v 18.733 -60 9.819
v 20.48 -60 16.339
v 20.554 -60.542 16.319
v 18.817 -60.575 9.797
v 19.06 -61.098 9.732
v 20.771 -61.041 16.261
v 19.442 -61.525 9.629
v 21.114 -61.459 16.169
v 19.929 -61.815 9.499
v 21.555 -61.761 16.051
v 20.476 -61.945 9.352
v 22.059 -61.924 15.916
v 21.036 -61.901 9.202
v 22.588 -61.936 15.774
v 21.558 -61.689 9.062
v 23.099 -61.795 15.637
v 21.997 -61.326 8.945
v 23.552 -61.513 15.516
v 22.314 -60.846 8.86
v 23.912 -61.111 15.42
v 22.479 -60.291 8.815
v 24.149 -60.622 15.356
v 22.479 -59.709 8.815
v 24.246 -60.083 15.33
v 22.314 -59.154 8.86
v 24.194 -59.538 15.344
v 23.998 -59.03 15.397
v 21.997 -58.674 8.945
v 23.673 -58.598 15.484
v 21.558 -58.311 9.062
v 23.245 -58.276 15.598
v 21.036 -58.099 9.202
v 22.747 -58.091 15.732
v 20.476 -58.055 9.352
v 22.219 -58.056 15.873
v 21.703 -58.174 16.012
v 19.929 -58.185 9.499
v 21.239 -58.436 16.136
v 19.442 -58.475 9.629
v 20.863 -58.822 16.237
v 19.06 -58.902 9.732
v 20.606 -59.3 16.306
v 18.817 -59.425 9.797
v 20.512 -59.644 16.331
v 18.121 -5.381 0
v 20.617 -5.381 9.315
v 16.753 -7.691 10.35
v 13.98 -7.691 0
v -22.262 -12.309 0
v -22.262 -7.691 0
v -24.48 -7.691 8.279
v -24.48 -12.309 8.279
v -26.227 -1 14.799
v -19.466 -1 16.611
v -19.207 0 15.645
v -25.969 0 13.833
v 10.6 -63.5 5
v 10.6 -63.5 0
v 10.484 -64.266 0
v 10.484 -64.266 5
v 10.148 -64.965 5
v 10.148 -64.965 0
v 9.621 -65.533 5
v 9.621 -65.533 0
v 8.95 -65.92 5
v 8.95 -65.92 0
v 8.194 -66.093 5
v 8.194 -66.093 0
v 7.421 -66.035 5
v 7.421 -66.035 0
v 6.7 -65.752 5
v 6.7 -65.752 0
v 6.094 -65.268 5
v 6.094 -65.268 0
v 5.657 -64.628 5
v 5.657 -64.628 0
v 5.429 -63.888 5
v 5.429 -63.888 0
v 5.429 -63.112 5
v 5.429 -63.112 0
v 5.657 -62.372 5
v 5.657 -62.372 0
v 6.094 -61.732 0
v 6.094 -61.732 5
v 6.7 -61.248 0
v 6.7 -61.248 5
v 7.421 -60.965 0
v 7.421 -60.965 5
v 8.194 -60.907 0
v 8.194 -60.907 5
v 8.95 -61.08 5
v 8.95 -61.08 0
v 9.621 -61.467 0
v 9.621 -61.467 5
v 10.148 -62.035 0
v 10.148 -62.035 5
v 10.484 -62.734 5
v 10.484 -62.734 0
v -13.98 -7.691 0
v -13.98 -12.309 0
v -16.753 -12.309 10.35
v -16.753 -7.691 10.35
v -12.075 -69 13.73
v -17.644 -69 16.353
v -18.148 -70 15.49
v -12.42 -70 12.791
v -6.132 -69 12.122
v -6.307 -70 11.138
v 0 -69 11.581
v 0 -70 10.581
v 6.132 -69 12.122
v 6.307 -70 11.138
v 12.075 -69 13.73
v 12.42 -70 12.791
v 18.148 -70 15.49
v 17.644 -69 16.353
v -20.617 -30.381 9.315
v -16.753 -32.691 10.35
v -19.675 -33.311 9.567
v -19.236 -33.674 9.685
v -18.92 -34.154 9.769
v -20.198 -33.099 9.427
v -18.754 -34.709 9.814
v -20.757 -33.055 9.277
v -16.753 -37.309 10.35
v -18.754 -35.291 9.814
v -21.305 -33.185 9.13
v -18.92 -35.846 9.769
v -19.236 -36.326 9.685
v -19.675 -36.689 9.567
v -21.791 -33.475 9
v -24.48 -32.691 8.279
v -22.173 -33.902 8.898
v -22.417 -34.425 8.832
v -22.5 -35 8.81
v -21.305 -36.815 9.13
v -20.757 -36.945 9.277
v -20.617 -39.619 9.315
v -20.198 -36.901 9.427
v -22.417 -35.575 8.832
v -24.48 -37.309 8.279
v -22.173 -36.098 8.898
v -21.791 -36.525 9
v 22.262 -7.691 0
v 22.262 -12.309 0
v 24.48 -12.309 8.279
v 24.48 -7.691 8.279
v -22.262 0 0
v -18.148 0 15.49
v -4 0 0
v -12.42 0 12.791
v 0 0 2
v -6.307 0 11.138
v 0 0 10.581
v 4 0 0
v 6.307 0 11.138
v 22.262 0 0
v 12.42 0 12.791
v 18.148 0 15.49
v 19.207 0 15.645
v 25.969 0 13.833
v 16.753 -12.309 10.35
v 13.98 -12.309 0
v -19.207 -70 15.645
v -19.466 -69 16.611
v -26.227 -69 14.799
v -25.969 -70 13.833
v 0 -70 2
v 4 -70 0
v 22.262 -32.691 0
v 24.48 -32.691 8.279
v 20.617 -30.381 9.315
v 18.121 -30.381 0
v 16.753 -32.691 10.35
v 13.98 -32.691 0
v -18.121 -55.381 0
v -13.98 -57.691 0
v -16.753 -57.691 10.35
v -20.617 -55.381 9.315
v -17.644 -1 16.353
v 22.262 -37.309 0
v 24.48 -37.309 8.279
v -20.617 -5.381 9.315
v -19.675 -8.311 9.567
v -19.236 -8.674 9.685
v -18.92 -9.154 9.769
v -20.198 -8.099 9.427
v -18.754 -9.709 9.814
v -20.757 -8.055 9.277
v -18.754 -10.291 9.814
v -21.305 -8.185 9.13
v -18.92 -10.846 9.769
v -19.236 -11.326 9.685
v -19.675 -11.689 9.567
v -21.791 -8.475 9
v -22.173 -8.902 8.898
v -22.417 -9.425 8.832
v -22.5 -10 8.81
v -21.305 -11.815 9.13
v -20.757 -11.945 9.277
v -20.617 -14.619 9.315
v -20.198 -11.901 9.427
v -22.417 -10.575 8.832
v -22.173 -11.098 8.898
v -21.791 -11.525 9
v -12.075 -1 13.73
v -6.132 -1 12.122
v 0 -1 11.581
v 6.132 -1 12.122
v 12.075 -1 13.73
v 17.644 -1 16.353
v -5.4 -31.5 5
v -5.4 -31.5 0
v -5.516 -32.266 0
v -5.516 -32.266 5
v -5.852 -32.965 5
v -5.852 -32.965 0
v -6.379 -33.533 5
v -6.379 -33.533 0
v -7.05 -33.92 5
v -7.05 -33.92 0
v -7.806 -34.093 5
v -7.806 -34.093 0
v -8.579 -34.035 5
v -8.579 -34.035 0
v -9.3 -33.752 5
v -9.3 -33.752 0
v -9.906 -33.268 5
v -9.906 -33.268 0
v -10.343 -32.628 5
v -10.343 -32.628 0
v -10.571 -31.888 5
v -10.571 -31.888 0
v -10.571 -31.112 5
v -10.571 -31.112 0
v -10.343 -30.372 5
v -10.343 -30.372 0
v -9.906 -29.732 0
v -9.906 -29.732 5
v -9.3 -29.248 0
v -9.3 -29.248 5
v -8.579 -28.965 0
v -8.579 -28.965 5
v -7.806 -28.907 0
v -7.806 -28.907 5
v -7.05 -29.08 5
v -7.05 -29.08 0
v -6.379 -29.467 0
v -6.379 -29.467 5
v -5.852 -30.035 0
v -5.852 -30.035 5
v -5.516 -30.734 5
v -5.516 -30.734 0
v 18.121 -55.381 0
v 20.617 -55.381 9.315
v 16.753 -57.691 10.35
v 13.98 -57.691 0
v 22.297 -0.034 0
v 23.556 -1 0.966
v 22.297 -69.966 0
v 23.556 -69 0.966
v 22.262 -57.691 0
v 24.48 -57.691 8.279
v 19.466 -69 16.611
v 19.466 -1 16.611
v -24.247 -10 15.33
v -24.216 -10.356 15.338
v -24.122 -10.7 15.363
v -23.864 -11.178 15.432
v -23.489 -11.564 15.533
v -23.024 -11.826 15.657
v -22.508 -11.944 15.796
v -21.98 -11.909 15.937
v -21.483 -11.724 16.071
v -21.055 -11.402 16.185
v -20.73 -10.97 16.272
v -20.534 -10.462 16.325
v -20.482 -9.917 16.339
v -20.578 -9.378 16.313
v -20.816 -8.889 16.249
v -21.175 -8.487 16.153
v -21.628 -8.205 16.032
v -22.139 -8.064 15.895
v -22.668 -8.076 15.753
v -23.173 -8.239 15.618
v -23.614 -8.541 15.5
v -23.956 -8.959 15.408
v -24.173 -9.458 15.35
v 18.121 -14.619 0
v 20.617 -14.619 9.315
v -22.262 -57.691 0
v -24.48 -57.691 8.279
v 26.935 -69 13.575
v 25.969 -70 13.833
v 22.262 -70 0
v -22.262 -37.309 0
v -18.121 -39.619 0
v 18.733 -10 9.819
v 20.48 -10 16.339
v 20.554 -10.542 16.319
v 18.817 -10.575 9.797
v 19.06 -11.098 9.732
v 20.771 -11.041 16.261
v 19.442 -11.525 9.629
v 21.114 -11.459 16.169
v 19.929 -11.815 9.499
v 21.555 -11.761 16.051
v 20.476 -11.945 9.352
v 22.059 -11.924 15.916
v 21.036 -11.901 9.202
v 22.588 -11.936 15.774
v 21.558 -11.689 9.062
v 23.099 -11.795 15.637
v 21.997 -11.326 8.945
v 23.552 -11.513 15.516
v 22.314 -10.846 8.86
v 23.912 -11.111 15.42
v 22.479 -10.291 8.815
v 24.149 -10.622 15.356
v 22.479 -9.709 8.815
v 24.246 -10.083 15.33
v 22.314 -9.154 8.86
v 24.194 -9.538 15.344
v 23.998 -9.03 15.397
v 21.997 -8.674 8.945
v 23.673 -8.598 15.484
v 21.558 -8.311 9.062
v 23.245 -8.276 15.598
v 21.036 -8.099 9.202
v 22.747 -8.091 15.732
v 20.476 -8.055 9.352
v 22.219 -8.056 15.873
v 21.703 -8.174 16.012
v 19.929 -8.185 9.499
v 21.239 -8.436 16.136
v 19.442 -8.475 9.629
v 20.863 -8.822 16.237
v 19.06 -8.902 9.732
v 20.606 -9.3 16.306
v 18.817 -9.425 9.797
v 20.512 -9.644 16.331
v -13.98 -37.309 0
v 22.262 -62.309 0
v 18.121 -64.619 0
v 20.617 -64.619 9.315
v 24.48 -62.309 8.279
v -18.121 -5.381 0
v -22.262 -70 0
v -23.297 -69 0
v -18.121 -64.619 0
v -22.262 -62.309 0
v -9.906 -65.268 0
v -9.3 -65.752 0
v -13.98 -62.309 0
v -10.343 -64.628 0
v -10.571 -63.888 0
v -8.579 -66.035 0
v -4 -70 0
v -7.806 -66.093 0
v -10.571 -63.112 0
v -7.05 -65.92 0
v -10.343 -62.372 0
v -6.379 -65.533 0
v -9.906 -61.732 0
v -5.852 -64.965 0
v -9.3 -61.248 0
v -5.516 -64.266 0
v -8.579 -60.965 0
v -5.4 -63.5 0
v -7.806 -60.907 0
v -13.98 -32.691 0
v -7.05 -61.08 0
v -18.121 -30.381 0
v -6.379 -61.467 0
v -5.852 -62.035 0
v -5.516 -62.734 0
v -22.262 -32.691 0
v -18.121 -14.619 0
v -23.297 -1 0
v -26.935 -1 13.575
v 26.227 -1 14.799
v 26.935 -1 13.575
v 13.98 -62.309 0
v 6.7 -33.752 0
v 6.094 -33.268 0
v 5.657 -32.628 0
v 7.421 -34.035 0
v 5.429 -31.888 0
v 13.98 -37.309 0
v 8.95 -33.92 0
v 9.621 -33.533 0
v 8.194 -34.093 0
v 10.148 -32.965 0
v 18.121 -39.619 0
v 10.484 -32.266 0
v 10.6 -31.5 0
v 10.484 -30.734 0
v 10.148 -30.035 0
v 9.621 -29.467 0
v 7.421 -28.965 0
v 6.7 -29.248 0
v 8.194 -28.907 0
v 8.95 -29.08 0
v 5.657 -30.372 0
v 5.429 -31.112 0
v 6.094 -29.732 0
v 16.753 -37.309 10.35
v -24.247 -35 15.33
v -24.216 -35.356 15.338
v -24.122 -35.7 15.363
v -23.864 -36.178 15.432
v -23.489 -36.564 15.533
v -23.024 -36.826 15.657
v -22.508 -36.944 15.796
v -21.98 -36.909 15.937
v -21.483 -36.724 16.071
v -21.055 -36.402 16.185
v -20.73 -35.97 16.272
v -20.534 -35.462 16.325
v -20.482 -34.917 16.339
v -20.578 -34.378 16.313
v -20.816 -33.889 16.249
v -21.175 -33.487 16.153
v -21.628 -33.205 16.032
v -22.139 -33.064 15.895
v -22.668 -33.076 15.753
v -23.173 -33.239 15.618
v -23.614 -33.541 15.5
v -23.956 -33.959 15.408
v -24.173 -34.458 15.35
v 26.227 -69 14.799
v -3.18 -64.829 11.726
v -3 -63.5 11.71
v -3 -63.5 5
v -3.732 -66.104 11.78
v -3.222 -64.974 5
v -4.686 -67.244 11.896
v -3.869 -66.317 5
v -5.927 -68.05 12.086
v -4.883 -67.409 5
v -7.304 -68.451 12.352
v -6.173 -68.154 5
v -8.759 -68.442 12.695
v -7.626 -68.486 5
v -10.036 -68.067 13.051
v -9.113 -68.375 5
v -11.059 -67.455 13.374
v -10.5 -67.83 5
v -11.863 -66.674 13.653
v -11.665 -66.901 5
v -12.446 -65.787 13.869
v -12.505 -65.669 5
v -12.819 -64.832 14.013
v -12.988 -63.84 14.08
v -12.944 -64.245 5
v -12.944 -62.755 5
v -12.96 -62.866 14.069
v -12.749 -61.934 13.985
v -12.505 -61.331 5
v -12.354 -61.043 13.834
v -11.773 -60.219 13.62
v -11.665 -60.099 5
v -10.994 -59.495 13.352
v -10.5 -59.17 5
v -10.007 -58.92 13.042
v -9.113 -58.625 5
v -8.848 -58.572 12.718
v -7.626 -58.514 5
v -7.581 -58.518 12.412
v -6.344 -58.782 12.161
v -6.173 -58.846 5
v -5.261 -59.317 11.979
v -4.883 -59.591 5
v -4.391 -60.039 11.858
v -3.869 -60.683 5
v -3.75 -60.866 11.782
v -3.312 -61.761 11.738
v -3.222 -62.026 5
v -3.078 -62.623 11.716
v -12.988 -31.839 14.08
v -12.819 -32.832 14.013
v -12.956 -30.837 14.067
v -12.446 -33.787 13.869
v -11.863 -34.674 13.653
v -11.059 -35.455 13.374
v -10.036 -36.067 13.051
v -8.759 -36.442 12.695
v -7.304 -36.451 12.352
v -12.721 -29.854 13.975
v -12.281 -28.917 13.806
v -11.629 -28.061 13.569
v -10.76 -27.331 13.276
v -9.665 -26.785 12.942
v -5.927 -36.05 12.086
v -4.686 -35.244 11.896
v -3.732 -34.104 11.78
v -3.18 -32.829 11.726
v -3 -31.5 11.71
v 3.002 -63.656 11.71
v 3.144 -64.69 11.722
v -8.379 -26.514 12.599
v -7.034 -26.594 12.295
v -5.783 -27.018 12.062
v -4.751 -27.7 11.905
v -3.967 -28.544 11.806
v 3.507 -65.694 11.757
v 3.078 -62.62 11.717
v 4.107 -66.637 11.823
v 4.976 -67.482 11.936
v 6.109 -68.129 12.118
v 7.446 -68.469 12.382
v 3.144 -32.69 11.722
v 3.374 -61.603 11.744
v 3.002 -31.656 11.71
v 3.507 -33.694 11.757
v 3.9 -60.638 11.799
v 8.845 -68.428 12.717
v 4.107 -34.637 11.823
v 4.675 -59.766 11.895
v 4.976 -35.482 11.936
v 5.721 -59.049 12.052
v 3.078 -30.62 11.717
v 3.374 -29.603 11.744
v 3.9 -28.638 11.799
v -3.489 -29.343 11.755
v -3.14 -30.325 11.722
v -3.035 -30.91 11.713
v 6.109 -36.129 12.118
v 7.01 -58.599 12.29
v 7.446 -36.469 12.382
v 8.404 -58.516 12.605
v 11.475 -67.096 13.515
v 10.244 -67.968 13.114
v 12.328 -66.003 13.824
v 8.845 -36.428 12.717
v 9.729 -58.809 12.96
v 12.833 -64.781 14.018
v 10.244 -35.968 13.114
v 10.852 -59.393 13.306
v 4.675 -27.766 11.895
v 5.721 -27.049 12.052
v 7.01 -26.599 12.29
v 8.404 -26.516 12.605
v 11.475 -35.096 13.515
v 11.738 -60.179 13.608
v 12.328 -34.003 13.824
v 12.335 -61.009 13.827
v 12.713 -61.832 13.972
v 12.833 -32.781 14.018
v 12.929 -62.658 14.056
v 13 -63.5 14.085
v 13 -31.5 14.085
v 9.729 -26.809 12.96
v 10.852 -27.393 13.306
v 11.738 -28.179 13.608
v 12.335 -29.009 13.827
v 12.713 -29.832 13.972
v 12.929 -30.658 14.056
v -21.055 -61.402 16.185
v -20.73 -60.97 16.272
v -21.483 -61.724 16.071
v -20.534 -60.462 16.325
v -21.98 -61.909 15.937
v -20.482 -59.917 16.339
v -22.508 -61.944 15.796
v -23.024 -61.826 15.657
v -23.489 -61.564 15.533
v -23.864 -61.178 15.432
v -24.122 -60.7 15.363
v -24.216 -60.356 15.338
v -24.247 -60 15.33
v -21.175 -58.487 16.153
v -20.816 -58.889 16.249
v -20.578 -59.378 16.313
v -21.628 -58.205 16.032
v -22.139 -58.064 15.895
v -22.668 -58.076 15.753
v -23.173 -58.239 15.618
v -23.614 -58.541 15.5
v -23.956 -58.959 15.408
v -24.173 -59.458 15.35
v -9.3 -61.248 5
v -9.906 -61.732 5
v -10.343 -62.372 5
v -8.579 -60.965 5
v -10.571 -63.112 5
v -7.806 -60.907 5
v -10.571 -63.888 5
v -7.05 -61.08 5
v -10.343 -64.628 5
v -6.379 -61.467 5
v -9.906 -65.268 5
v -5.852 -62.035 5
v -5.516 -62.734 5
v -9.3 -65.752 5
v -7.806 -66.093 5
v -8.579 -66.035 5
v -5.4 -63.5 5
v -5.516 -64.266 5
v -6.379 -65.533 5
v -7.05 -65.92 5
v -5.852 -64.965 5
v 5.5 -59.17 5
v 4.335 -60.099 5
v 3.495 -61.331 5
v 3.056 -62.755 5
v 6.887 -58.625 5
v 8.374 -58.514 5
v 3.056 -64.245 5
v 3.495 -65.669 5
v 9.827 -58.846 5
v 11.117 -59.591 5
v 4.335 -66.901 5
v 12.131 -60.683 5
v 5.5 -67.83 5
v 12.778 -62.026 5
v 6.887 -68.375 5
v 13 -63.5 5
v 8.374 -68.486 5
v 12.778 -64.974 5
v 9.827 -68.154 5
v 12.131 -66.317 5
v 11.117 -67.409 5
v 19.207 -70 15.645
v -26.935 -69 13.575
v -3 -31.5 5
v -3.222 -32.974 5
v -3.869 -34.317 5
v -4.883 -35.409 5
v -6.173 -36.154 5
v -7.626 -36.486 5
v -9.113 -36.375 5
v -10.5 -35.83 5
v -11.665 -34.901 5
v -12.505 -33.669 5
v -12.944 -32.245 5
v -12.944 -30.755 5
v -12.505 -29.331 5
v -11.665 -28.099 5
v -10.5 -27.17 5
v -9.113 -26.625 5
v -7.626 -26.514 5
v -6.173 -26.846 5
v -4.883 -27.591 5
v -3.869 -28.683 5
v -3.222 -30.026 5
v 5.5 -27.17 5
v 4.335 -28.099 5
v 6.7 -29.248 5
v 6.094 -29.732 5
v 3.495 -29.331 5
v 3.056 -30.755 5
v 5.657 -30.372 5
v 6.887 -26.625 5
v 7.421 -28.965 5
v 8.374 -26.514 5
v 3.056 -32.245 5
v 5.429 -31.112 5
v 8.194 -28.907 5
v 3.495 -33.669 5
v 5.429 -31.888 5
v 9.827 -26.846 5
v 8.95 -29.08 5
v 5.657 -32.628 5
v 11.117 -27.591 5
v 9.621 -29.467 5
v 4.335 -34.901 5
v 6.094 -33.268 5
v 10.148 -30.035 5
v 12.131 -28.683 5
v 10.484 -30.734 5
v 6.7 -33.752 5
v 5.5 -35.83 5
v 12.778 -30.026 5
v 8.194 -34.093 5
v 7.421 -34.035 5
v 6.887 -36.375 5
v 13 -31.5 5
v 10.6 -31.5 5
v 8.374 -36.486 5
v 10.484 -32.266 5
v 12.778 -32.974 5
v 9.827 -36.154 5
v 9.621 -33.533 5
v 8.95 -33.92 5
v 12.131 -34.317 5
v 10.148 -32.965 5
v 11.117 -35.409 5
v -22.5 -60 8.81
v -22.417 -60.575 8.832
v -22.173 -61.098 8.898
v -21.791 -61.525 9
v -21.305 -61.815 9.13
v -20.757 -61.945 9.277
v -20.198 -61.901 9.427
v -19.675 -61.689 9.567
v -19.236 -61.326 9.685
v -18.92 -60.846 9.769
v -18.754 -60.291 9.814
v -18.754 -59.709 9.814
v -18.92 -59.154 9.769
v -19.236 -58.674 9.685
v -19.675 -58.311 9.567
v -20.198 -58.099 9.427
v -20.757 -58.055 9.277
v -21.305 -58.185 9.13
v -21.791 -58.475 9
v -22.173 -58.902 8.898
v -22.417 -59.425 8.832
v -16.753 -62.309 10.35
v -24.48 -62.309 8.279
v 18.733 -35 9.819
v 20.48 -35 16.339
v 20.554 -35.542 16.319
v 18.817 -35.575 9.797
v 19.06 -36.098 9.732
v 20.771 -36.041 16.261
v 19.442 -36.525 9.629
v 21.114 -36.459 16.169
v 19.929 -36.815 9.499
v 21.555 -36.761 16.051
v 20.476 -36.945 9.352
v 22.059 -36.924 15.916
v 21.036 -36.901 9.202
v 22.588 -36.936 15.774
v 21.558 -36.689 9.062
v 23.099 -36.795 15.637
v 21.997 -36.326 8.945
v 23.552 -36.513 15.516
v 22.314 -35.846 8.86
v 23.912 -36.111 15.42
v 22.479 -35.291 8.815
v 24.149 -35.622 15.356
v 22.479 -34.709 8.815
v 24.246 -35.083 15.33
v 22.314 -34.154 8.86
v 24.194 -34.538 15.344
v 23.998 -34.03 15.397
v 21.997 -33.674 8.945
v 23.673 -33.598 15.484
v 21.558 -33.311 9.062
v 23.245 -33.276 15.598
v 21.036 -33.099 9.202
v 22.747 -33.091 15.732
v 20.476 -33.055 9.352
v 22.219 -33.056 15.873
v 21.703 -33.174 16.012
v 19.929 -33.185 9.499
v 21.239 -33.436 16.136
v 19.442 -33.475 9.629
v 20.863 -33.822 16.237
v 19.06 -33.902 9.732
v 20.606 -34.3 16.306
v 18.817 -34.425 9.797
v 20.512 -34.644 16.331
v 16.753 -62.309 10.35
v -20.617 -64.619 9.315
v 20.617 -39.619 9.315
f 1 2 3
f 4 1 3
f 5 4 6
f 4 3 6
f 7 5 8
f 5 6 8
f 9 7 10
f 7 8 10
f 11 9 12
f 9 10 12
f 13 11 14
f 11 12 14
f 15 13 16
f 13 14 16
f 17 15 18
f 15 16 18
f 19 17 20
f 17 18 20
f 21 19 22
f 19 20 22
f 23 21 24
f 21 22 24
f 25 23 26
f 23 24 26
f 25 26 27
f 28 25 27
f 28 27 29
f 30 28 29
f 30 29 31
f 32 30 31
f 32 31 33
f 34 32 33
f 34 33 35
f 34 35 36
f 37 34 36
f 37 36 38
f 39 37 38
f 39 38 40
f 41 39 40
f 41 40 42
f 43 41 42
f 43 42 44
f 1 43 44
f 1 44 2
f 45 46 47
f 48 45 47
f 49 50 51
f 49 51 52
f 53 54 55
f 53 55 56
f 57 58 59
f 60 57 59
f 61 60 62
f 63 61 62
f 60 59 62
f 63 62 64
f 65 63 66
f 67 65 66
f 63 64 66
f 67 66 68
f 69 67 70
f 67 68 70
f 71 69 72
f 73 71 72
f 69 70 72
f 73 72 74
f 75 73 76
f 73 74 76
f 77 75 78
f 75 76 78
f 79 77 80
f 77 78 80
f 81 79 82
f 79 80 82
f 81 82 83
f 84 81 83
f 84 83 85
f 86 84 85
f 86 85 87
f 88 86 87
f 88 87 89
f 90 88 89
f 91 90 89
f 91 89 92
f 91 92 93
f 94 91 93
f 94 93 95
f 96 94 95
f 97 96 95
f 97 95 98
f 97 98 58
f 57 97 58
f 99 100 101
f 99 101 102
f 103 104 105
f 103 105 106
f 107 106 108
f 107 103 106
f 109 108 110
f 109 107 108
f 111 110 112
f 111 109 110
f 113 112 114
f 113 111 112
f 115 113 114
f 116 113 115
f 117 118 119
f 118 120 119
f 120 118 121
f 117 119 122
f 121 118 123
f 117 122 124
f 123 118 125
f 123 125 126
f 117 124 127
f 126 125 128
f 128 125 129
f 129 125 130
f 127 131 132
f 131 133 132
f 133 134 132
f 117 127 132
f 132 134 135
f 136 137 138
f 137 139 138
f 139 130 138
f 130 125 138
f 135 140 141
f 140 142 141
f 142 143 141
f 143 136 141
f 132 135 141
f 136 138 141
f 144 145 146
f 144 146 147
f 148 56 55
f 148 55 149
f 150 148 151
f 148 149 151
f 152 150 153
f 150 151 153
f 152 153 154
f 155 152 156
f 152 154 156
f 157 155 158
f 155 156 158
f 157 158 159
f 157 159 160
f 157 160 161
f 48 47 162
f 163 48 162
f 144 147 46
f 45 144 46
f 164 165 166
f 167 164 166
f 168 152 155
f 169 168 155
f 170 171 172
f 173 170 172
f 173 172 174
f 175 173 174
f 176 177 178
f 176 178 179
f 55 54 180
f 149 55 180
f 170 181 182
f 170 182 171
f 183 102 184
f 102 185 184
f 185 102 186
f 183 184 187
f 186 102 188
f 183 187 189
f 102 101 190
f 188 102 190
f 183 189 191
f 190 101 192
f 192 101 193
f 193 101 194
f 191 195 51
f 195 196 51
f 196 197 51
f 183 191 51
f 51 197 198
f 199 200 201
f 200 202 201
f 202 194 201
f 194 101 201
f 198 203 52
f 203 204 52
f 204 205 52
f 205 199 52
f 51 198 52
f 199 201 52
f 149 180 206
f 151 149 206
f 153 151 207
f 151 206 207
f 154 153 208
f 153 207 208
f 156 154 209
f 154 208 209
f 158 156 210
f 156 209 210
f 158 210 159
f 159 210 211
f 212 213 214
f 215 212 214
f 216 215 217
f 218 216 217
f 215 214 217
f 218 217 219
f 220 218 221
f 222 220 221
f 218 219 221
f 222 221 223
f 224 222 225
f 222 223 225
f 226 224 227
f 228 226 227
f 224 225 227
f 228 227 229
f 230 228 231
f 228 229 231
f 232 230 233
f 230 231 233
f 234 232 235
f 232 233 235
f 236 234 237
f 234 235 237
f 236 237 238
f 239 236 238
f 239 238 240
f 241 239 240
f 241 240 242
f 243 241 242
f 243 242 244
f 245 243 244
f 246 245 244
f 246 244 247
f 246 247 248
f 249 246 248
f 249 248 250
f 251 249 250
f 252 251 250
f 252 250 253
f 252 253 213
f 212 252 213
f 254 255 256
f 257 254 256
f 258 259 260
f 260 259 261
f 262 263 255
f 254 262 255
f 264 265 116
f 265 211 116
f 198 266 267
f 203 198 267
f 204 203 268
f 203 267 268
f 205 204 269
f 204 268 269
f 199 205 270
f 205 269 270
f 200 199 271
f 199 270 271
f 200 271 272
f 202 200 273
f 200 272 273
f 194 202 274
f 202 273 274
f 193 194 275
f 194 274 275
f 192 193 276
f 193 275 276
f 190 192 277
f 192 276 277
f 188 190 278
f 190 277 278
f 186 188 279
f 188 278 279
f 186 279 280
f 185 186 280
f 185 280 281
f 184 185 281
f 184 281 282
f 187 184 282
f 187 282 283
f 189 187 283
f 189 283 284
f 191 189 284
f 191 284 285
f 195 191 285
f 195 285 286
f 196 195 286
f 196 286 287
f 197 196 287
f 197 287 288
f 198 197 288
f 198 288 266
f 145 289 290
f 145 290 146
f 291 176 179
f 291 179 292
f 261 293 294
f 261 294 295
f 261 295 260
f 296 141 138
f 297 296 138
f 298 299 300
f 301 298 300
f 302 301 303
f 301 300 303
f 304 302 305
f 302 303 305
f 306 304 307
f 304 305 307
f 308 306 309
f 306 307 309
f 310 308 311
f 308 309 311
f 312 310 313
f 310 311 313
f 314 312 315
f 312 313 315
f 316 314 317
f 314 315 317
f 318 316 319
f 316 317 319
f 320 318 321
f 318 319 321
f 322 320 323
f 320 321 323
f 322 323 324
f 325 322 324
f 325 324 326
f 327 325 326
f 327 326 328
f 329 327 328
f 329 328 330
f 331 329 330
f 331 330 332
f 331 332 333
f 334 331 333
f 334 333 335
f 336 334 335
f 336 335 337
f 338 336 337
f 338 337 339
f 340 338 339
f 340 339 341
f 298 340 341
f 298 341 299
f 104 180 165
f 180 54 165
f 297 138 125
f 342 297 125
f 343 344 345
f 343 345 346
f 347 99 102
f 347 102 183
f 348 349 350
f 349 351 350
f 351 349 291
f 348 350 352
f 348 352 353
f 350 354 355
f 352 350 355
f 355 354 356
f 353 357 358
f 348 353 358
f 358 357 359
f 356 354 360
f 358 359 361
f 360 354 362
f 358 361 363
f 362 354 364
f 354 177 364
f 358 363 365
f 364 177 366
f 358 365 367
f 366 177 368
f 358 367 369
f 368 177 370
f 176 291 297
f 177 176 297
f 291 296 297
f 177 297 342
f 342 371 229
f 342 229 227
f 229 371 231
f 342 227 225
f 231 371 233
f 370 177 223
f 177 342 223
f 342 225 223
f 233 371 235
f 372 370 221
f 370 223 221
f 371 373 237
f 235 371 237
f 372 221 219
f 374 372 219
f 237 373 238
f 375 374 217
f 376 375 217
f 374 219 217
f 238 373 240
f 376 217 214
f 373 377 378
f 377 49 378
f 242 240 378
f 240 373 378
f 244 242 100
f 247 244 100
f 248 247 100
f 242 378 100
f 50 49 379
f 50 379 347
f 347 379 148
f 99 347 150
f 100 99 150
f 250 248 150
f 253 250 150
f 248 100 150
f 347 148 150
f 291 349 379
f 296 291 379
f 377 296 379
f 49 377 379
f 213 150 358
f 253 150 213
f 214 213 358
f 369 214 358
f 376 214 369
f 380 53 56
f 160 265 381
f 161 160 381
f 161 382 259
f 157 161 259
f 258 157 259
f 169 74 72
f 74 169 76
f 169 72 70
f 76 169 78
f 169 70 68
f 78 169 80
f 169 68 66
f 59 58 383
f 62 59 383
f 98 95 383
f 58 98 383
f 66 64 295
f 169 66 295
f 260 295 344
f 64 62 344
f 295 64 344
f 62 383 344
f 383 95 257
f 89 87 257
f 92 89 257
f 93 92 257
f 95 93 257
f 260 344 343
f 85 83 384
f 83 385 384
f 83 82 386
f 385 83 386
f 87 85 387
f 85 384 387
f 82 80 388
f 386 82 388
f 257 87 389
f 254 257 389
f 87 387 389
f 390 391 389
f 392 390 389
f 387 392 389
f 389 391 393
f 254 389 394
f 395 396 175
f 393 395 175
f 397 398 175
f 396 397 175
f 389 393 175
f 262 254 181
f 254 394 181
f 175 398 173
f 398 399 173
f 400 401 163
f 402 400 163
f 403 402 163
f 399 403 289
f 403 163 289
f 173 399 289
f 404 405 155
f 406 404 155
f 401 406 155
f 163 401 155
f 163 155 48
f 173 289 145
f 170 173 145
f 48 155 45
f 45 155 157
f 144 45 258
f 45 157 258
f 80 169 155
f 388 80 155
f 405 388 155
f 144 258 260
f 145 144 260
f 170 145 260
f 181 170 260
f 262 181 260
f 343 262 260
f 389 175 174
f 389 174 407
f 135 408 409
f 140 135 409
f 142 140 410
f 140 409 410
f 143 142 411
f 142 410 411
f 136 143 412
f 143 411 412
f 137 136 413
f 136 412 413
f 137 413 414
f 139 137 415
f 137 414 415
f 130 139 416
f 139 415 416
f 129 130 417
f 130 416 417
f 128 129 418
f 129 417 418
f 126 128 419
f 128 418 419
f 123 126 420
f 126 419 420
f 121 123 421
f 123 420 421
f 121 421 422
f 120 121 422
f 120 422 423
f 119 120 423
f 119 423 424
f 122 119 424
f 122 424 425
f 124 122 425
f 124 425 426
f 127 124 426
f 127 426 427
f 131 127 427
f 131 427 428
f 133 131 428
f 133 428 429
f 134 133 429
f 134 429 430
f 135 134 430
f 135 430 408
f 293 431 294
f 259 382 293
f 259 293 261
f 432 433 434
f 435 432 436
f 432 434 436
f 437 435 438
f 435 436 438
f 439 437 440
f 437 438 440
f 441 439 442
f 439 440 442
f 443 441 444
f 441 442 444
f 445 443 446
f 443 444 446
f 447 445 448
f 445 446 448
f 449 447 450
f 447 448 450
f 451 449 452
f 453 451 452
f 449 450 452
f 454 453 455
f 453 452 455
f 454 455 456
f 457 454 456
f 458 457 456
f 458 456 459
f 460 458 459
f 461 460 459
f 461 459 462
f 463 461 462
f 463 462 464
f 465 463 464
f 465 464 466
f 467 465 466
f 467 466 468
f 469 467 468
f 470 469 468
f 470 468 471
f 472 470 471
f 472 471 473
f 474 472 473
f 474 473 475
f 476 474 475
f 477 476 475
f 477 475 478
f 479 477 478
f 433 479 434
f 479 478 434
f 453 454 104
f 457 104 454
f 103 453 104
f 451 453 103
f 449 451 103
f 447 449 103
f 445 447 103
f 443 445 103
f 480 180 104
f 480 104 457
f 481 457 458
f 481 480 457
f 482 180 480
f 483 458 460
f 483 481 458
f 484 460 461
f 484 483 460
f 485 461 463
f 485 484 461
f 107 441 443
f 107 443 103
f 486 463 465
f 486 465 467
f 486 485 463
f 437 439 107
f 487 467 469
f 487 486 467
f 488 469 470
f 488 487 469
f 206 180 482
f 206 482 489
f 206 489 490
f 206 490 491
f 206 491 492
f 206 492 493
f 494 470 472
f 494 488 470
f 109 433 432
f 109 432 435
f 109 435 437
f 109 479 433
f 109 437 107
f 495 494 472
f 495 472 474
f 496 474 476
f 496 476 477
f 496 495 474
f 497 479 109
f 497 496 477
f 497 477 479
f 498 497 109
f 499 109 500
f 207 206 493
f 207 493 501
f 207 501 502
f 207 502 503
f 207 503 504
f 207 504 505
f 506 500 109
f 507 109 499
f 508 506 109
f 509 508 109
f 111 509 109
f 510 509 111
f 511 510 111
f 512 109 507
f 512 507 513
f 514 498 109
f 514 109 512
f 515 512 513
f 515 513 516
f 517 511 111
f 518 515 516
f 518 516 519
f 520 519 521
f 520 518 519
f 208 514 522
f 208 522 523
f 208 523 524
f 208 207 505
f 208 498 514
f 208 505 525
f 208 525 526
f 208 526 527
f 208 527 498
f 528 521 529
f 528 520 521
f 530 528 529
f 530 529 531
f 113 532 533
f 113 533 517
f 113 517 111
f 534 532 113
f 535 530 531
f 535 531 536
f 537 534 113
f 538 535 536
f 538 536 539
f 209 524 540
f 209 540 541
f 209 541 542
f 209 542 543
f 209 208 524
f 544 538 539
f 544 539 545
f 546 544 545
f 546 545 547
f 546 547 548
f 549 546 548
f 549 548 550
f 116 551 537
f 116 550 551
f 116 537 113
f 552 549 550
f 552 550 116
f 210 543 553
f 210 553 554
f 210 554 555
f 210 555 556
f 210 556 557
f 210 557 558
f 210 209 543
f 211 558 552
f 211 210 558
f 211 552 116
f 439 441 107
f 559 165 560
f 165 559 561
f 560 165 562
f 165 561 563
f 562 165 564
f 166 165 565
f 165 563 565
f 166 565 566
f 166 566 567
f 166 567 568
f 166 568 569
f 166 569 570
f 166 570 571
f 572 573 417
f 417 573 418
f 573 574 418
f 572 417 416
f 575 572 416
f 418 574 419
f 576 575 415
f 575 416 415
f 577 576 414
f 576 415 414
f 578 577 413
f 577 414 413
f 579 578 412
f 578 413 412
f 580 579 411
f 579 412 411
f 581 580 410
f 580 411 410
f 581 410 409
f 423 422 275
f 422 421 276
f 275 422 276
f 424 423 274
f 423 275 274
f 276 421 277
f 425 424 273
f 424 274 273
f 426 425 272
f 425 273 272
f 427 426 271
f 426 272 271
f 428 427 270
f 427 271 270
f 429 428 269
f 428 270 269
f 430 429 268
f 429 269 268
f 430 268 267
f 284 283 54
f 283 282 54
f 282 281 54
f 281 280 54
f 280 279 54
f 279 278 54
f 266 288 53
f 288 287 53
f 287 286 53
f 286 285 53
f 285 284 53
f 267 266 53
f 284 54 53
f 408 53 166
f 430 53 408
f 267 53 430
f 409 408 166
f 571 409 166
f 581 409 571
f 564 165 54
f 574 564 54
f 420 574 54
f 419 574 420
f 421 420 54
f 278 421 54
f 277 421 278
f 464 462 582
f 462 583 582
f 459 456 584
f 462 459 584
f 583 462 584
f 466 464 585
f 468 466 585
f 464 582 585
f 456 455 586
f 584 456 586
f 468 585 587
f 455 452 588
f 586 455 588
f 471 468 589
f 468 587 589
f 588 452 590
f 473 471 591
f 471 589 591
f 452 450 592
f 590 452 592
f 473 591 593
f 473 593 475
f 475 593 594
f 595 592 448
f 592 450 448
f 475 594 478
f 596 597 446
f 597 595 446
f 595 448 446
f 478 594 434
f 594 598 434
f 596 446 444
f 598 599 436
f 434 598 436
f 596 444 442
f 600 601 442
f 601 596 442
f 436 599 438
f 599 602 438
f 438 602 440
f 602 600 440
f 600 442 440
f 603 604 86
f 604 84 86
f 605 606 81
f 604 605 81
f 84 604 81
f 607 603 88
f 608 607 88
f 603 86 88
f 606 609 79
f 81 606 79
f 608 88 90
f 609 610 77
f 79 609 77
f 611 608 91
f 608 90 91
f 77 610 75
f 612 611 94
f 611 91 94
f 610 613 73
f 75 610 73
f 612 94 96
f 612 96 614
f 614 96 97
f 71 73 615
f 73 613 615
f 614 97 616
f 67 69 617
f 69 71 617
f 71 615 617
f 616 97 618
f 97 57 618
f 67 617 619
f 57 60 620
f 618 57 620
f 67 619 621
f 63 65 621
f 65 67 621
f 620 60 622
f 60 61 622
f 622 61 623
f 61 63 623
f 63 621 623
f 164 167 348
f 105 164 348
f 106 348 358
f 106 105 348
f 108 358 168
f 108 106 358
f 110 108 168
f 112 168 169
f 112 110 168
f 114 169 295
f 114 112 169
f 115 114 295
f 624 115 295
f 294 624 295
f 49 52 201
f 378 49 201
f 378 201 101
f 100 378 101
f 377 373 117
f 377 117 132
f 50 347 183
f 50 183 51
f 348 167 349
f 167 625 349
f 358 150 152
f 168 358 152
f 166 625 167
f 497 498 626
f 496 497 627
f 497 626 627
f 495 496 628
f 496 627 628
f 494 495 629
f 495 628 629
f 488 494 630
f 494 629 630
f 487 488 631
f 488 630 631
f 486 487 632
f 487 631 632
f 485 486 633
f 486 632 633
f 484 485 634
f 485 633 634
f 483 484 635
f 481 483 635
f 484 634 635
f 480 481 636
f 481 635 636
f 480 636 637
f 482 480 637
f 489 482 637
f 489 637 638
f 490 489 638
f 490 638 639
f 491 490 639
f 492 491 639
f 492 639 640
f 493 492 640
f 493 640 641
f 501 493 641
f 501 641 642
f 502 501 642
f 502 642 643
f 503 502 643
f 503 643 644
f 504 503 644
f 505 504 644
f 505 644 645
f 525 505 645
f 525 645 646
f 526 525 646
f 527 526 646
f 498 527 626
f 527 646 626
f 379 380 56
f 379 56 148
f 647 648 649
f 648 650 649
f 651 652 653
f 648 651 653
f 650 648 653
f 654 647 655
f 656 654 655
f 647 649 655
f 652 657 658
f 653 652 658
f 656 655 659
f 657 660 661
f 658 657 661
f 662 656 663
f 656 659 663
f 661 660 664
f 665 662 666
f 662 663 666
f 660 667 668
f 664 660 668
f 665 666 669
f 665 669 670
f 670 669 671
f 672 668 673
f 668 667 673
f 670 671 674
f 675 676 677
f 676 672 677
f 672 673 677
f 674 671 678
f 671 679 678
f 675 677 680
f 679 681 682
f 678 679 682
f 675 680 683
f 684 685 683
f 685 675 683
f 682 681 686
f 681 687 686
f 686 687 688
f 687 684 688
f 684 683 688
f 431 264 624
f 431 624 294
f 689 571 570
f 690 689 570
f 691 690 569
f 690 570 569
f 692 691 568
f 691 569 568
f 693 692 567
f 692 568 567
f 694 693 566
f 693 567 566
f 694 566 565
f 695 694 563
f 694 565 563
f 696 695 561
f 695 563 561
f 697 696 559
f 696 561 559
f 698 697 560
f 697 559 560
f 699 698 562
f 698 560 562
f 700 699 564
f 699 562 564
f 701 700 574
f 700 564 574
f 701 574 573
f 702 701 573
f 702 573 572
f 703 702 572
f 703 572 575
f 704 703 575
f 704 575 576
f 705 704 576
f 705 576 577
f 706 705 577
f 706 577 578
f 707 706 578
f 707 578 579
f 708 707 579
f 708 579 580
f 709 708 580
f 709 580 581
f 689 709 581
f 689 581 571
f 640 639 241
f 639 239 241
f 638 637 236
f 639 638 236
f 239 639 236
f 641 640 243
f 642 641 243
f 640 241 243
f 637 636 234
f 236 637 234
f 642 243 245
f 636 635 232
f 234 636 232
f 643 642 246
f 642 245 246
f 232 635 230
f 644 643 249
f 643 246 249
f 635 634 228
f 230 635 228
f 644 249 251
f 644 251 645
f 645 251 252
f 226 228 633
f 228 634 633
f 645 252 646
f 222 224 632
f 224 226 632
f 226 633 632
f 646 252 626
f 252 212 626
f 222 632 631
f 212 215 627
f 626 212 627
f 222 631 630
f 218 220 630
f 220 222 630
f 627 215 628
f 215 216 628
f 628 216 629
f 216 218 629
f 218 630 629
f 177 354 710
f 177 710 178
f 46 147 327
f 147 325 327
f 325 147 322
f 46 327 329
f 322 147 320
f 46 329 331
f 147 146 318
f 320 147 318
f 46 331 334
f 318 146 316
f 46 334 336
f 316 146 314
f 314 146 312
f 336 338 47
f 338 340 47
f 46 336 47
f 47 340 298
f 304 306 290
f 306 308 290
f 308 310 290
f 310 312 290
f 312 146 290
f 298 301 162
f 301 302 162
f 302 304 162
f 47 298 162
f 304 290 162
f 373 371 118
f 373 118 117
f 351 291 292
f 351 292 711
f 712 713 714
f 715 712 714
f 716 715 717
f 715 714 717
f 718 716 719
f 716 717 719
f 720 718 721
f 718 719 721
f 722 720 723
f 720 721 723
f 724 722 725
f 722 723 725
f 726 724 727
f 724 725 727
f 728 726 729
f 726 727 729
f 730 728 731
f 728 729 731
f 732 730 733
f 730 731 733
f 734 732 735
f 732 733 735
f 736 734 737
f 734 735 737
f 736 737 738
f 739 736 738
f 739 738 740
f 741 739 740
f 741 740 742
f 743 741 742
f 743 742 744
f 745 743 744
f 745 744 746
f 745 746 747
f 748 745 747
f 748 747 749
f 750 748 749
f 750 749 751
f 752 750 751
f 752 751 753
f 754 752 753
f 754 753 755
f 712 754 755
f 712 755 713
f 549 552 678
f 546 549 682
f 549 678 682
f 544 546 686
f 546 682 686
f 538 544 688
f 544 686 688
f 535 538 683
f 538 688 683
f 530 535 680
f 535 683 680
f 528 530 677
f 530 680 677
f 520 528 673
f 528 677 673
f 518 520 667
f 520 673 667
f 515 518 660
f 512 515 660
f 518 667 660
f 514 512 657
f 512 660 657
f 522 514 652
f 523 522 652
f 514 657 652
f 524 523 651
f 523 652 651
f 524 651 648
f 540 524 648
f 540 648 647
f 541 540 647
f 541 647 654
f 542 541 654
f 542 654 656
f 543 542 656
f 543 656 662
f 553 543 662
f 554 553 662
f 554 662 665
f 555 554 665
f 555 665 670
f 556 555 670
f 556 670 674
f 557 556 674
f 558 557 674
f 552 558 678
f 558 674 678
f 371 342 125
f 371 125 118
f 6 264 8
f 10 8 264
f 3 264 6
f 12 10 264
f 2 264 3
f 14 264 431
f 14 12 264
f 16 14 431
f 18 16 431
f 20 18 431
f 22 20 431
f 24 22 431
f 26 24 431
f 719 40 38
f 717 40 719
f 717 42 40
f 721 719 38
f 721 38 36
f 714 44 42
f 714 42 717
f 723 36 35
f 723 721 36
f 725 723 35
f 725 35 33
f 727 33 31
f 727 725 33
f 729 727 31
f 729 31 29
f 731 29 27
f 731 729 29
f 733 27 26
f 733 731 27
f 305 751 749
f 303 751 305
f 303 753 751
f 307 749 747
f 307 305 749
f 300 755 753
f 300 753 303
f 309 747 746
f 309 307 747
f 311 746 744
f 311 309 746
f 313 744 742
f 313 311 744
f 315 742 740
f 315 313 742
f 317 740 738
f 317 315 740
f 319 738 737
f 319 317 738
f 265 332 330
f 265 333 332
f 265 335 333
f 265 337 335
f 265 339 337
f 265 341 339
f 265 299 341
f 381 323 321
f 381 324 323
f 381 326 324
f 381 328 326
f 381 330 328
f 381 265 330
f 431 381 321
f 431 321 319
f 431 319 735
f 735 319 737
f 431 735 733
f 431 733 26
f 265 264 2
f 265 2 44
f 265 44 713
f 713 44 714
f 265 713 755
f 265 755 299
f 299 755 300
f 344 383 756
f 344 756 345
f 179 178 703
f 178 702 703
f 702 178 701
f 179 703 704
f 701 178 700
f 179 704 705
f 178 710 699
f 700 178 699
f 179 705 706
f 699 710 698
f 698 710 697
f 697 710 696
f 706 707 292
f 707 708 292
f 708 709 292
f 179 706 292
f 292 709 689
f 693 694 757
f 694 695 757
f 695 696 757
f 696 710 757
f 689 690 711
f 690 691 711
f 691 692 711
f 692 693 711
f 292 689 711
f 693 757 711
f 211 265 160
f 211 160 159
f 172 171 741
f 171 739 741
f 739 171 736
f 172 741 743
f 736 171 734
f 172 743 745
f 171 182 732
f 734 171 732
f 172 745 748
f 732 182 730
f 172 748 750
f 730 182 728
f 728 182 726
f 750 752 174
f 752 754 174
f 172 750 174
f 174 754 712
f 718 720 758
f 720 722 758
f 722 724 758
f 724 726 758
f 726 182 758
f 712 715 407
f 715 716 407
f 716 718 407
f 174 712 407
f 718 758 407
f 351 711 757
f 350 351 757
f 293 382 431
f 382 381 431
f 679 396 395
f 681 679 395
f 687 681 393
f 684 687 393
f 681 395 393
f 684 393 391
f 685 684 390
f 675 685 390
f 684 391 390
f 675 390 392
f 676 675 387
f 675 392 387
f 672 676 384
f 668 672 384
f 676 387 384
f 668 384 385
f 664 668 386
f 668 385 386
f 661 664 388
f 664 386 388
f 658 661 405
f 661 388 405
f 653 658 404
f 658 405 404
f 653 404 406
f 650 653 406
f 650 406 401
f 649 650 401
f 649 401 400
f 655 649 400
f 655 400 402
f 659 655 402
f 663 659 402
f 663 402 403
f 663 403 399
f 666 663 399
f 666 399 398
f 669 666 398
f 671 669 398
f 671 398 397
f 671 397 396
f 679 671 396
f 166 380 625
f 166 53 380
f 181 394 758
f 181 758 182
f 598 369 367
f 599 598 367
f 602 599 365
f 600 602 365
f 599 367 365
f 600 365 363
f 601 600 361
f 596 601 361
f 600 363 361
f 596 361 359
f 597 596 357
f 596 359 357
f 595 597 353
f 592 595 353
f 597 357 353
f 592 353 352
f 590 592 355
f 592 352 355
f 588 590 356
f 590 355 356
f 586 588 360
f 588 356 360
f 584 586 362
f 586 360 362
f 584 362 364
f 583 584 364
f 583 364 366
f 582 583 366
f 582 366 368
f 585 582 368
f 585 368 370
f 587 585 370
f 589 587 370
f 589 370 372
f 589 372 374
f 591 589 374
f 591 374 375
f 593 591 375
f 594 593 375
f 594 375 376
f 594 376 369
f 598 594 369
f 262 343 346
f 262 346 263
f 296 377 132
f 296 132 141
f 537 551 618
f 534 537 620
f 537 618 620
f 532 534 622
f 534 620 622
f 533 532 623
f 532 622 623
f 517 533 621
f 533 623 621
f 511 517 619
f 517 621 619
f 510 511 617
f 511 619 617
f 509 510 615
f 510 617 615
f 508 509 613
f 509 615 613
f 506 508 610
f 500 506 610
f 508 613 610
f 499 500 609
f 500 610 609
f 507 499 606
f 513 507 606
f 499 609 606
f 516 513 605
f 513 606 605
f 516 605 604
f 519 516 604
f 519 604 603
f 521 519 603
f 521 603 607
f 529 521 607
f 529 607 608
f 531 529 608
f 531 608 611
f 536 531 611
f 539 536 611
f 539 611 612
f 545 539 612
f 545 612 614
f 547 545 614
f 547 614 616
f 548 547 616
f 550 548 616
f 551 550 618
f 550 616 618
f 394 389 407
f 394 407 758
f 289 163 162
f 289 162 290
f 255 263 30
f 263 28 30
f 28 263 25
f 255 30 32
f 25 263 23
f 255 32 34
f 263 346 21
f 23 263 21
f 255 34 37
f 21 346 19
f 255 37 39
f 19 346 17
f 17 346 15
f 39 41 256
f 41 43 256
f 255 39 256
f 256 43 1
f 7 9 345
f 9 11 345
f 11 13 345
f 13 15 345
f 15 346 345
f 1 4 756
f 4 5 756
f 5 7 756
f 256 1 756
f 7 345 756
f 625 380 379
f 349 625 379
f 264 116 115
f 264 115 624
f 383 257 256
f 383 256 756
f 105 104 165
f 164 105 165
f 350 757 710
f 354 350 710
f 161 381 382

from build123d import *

# Parameters (mm, degrees)
PAD_DEPTH       = 70
SKETCH001_R     = 2.6
POCKET_DEPTH    = 16.870811
SKETCH002_R     = 5
POCKET001_DEPTH = 11.870811
SKETCH003_R     = 1.95
POCKET002_DEPTH = 28.12229
SKETCH004_R     = 1.95
POCKET003_DEPTH = 28.12229
POCKET004_DEPTH = 21.37229
POCKET005_DEPTH = 21.37229
CHAMFER_SIZE    = 1


with BuildPart() as part:
    # Sketch → Pad (new body)
    with BuildSketch(Plane.XZ):
        with BuildLine():
            Line((-12.5, 0), (-4, 0))
            Line((-4, 0), (0, 2))
            Line((0, 2), (4, 0))
            Line((4, 0), (12.5, 0))
            Line((12.5, 0), (23.297234, 0))
            Line((27.193332, 14.540439), (23.297234, 0))
            Line((18.5, 16.869811), (27.193332, 14.540439))
            ThreePointArc((-18.5, 16.869811), (0, 11.58092), (18.5, 16.869811))
            Line((-18.5, 16.869811), (-27.193332, 14.540439))
            Line((-27.193332, 14.540439), (-23.297234, 0))
            Line((-12.5, 0), (-23.297234, 0))
        make_face()
    extrude(amount=PAD_DEPTH)

    # Sketch001 (on Face1 of Pad) → Pocket (cut, through all)
    with BuildSketch(Plane(origin=(0, 0, 0), x_dir=(1, 0, 0), z_dir=(0, 0, -1))):
        with Locations((-8, 63.5)):
            Circle(SKETCH001_R)
        with Locations((8, 63.5)):
            Circle(SKETCH001_R)
        with Locations((-8, 31.5)):
            Circle(SKETCH001_R)
        with Locations((8, 31.5)):
            Circle(SKETCH001_R)
    extrude(amount=-POCKET_DEPTH, mode=Mode.SUBTRACT)

    # Sketch002 → Pocket001 (cut, through all)
    with BuildSketch(Plane(origin=(0, 0, 5), x_dir=(1, 0, 0), z_dir=(0, 0, -1))):
        with Locations((-8, 63.5)):
            Circle(SKETCH002_R)
        with Locations((8, 63.5)):
            Circle(SKETCH002_R)
        with Locations((8, 31.5)):
            Circle(SKETCH002_R)
        with Locations((-8, 31.5)):
            Circle(SKETCH002_R)
    extrude(amount=-POCKET001_DEPTH, mode=Mode.SUBTRACT)

    # Sketch003 (on Face15 of Pocket001) → Pocket002 (cut, through all)
    with BuildSketch(Plane(origin=(-5.456718, 0, 20.364748), x_dir=(-0.965926, 0, -0.258819), z_dir=(-0.258819, 0, 0.965926))):
        with Locations((17.5034, 60)):
            Circle(SKETCH003_R)
        with Locations((17.5034, 35)):
            Circle(SKETCH003_R)
        with Locations((17.5034, 10)):
            Circle(SKETCH003_R)
    extrude(amount=-POCKET002_DEPTH, mode=Mode.SUBTRACT)

    # Sketch004 (on Face16 of Pocket002) → Pocket003 (cut, through all)
    with BuildSketch(Plane(origin=(5.456718, 0, 20.364748), x_dir=(-0.965926, 0, 0.258819), z_dir=(0.258819, 0, 0.965926))):
        with Locations((-17.5034, 60)):
            Circle(SKETCH004_R)
        with Locations((-17.5034, 35)):
            Circle(SKETCH004_R)
        with Locations((-17.5034, 10)):
            Circle(SKETCH004_R)
    extrude(amount=-POCKET003_DEPTH, mode=Mode.SUBTRACT)

    # Sketch005 (on DatumPlane) → Pocket004 (cut, through all)
    with BuildSketch(Plane(origin=(3.709689, 0, 13.844748), x_dir=(-0.965926, 0, 0.258819), z_dir=(0.258819, 0, 0.965926))):
        Polygon((-13.5034, 62.309401), (-17.5034, 64.618802), (-21.5034, 62.309401), (-21.5034, 57.690599), (-17.5034, 55.381198), (-13.5034, 57.690599), align=None)
        Polygon((-13.5034, 37.309401), (-17.5034, 39.618802), (-21.5034, 37.309401), (-21.5034, 32.690599), (-17.5034, 30.381198), (-13.5034, 32.690599), align=None)
        Polygon((-13.5034, 12.309401), (-17.5034, 14.618802), (-21.5034, 12.309401), (-21.5034, 7.690599), (-17.5034, 5.381198), (-13.5034, 7.690599), align=None)
    extrude(amount=-POCKET004_DEPTH, mode=Mode.SUBTRACT)

    # Sketch006 (on DatumPlane) → Pocket005 (cut, through all)
    with BuildSketch(Plane(origin=(-3.709689, 0, 13.844748), x_dir=(-0.965926, 0, -0.258819), z_dir=(-0.258819, 0, 0.965926))):
        Polygon((21.5034, 62.309401), (17.5034, 64.618802), (13.5034, 62.309401), (13.5034, 57.690599), (17.5034, 55.381198), (21.5034, 57.690599), align=None)
        Polygon((21.5034, 37.309401), (17.5034, 39.618802), (13.5034, 37.309401), (13.5034, 32.690599), (17.5034, 30.381198), (21.5034, 32.690599), align=None)
        Polygon((21.5034, 12.309401), (17.5034, 14.618802), (13.5034, 12.309401), (13.5034, 7.690599), (17.5034, 5.381198), (21.5034, 7.690599), align=None)
    extrude(amount=-POCKET005_DEPTH, mode=Mode.SUBTRACT)

    # Chamfer
    chamfer_edges = [part.edges().sort_by_distance(p)[0] for p in [
        (-25.245283, -70, 7.27022),
        (-27.193332, -35, 14.540439),
        (-22.846666, -70, 15.705125),
        (-18.5, -35, 16.869811),
        (-22.846666, 0, 15.705125),
        (-25.245283, 0, 7.27022),
        (22.846666, -70, 15.705125),
        (18.5, -35, 16.869811),
        (27.193332, -35, 14.540439),
        (22.846666, 0, 15.705125),
        (25.245283, -70, 7.27022),
        (25.245283, 0, 7.27022),
        (23.297234, -35, 0),
        (0, 0, 11.58092),
        (0, -70, 11.58092),
    ]]
    chamfer(chamfer_edges, length=CHAMFER_SIZE)


solid = part.part
